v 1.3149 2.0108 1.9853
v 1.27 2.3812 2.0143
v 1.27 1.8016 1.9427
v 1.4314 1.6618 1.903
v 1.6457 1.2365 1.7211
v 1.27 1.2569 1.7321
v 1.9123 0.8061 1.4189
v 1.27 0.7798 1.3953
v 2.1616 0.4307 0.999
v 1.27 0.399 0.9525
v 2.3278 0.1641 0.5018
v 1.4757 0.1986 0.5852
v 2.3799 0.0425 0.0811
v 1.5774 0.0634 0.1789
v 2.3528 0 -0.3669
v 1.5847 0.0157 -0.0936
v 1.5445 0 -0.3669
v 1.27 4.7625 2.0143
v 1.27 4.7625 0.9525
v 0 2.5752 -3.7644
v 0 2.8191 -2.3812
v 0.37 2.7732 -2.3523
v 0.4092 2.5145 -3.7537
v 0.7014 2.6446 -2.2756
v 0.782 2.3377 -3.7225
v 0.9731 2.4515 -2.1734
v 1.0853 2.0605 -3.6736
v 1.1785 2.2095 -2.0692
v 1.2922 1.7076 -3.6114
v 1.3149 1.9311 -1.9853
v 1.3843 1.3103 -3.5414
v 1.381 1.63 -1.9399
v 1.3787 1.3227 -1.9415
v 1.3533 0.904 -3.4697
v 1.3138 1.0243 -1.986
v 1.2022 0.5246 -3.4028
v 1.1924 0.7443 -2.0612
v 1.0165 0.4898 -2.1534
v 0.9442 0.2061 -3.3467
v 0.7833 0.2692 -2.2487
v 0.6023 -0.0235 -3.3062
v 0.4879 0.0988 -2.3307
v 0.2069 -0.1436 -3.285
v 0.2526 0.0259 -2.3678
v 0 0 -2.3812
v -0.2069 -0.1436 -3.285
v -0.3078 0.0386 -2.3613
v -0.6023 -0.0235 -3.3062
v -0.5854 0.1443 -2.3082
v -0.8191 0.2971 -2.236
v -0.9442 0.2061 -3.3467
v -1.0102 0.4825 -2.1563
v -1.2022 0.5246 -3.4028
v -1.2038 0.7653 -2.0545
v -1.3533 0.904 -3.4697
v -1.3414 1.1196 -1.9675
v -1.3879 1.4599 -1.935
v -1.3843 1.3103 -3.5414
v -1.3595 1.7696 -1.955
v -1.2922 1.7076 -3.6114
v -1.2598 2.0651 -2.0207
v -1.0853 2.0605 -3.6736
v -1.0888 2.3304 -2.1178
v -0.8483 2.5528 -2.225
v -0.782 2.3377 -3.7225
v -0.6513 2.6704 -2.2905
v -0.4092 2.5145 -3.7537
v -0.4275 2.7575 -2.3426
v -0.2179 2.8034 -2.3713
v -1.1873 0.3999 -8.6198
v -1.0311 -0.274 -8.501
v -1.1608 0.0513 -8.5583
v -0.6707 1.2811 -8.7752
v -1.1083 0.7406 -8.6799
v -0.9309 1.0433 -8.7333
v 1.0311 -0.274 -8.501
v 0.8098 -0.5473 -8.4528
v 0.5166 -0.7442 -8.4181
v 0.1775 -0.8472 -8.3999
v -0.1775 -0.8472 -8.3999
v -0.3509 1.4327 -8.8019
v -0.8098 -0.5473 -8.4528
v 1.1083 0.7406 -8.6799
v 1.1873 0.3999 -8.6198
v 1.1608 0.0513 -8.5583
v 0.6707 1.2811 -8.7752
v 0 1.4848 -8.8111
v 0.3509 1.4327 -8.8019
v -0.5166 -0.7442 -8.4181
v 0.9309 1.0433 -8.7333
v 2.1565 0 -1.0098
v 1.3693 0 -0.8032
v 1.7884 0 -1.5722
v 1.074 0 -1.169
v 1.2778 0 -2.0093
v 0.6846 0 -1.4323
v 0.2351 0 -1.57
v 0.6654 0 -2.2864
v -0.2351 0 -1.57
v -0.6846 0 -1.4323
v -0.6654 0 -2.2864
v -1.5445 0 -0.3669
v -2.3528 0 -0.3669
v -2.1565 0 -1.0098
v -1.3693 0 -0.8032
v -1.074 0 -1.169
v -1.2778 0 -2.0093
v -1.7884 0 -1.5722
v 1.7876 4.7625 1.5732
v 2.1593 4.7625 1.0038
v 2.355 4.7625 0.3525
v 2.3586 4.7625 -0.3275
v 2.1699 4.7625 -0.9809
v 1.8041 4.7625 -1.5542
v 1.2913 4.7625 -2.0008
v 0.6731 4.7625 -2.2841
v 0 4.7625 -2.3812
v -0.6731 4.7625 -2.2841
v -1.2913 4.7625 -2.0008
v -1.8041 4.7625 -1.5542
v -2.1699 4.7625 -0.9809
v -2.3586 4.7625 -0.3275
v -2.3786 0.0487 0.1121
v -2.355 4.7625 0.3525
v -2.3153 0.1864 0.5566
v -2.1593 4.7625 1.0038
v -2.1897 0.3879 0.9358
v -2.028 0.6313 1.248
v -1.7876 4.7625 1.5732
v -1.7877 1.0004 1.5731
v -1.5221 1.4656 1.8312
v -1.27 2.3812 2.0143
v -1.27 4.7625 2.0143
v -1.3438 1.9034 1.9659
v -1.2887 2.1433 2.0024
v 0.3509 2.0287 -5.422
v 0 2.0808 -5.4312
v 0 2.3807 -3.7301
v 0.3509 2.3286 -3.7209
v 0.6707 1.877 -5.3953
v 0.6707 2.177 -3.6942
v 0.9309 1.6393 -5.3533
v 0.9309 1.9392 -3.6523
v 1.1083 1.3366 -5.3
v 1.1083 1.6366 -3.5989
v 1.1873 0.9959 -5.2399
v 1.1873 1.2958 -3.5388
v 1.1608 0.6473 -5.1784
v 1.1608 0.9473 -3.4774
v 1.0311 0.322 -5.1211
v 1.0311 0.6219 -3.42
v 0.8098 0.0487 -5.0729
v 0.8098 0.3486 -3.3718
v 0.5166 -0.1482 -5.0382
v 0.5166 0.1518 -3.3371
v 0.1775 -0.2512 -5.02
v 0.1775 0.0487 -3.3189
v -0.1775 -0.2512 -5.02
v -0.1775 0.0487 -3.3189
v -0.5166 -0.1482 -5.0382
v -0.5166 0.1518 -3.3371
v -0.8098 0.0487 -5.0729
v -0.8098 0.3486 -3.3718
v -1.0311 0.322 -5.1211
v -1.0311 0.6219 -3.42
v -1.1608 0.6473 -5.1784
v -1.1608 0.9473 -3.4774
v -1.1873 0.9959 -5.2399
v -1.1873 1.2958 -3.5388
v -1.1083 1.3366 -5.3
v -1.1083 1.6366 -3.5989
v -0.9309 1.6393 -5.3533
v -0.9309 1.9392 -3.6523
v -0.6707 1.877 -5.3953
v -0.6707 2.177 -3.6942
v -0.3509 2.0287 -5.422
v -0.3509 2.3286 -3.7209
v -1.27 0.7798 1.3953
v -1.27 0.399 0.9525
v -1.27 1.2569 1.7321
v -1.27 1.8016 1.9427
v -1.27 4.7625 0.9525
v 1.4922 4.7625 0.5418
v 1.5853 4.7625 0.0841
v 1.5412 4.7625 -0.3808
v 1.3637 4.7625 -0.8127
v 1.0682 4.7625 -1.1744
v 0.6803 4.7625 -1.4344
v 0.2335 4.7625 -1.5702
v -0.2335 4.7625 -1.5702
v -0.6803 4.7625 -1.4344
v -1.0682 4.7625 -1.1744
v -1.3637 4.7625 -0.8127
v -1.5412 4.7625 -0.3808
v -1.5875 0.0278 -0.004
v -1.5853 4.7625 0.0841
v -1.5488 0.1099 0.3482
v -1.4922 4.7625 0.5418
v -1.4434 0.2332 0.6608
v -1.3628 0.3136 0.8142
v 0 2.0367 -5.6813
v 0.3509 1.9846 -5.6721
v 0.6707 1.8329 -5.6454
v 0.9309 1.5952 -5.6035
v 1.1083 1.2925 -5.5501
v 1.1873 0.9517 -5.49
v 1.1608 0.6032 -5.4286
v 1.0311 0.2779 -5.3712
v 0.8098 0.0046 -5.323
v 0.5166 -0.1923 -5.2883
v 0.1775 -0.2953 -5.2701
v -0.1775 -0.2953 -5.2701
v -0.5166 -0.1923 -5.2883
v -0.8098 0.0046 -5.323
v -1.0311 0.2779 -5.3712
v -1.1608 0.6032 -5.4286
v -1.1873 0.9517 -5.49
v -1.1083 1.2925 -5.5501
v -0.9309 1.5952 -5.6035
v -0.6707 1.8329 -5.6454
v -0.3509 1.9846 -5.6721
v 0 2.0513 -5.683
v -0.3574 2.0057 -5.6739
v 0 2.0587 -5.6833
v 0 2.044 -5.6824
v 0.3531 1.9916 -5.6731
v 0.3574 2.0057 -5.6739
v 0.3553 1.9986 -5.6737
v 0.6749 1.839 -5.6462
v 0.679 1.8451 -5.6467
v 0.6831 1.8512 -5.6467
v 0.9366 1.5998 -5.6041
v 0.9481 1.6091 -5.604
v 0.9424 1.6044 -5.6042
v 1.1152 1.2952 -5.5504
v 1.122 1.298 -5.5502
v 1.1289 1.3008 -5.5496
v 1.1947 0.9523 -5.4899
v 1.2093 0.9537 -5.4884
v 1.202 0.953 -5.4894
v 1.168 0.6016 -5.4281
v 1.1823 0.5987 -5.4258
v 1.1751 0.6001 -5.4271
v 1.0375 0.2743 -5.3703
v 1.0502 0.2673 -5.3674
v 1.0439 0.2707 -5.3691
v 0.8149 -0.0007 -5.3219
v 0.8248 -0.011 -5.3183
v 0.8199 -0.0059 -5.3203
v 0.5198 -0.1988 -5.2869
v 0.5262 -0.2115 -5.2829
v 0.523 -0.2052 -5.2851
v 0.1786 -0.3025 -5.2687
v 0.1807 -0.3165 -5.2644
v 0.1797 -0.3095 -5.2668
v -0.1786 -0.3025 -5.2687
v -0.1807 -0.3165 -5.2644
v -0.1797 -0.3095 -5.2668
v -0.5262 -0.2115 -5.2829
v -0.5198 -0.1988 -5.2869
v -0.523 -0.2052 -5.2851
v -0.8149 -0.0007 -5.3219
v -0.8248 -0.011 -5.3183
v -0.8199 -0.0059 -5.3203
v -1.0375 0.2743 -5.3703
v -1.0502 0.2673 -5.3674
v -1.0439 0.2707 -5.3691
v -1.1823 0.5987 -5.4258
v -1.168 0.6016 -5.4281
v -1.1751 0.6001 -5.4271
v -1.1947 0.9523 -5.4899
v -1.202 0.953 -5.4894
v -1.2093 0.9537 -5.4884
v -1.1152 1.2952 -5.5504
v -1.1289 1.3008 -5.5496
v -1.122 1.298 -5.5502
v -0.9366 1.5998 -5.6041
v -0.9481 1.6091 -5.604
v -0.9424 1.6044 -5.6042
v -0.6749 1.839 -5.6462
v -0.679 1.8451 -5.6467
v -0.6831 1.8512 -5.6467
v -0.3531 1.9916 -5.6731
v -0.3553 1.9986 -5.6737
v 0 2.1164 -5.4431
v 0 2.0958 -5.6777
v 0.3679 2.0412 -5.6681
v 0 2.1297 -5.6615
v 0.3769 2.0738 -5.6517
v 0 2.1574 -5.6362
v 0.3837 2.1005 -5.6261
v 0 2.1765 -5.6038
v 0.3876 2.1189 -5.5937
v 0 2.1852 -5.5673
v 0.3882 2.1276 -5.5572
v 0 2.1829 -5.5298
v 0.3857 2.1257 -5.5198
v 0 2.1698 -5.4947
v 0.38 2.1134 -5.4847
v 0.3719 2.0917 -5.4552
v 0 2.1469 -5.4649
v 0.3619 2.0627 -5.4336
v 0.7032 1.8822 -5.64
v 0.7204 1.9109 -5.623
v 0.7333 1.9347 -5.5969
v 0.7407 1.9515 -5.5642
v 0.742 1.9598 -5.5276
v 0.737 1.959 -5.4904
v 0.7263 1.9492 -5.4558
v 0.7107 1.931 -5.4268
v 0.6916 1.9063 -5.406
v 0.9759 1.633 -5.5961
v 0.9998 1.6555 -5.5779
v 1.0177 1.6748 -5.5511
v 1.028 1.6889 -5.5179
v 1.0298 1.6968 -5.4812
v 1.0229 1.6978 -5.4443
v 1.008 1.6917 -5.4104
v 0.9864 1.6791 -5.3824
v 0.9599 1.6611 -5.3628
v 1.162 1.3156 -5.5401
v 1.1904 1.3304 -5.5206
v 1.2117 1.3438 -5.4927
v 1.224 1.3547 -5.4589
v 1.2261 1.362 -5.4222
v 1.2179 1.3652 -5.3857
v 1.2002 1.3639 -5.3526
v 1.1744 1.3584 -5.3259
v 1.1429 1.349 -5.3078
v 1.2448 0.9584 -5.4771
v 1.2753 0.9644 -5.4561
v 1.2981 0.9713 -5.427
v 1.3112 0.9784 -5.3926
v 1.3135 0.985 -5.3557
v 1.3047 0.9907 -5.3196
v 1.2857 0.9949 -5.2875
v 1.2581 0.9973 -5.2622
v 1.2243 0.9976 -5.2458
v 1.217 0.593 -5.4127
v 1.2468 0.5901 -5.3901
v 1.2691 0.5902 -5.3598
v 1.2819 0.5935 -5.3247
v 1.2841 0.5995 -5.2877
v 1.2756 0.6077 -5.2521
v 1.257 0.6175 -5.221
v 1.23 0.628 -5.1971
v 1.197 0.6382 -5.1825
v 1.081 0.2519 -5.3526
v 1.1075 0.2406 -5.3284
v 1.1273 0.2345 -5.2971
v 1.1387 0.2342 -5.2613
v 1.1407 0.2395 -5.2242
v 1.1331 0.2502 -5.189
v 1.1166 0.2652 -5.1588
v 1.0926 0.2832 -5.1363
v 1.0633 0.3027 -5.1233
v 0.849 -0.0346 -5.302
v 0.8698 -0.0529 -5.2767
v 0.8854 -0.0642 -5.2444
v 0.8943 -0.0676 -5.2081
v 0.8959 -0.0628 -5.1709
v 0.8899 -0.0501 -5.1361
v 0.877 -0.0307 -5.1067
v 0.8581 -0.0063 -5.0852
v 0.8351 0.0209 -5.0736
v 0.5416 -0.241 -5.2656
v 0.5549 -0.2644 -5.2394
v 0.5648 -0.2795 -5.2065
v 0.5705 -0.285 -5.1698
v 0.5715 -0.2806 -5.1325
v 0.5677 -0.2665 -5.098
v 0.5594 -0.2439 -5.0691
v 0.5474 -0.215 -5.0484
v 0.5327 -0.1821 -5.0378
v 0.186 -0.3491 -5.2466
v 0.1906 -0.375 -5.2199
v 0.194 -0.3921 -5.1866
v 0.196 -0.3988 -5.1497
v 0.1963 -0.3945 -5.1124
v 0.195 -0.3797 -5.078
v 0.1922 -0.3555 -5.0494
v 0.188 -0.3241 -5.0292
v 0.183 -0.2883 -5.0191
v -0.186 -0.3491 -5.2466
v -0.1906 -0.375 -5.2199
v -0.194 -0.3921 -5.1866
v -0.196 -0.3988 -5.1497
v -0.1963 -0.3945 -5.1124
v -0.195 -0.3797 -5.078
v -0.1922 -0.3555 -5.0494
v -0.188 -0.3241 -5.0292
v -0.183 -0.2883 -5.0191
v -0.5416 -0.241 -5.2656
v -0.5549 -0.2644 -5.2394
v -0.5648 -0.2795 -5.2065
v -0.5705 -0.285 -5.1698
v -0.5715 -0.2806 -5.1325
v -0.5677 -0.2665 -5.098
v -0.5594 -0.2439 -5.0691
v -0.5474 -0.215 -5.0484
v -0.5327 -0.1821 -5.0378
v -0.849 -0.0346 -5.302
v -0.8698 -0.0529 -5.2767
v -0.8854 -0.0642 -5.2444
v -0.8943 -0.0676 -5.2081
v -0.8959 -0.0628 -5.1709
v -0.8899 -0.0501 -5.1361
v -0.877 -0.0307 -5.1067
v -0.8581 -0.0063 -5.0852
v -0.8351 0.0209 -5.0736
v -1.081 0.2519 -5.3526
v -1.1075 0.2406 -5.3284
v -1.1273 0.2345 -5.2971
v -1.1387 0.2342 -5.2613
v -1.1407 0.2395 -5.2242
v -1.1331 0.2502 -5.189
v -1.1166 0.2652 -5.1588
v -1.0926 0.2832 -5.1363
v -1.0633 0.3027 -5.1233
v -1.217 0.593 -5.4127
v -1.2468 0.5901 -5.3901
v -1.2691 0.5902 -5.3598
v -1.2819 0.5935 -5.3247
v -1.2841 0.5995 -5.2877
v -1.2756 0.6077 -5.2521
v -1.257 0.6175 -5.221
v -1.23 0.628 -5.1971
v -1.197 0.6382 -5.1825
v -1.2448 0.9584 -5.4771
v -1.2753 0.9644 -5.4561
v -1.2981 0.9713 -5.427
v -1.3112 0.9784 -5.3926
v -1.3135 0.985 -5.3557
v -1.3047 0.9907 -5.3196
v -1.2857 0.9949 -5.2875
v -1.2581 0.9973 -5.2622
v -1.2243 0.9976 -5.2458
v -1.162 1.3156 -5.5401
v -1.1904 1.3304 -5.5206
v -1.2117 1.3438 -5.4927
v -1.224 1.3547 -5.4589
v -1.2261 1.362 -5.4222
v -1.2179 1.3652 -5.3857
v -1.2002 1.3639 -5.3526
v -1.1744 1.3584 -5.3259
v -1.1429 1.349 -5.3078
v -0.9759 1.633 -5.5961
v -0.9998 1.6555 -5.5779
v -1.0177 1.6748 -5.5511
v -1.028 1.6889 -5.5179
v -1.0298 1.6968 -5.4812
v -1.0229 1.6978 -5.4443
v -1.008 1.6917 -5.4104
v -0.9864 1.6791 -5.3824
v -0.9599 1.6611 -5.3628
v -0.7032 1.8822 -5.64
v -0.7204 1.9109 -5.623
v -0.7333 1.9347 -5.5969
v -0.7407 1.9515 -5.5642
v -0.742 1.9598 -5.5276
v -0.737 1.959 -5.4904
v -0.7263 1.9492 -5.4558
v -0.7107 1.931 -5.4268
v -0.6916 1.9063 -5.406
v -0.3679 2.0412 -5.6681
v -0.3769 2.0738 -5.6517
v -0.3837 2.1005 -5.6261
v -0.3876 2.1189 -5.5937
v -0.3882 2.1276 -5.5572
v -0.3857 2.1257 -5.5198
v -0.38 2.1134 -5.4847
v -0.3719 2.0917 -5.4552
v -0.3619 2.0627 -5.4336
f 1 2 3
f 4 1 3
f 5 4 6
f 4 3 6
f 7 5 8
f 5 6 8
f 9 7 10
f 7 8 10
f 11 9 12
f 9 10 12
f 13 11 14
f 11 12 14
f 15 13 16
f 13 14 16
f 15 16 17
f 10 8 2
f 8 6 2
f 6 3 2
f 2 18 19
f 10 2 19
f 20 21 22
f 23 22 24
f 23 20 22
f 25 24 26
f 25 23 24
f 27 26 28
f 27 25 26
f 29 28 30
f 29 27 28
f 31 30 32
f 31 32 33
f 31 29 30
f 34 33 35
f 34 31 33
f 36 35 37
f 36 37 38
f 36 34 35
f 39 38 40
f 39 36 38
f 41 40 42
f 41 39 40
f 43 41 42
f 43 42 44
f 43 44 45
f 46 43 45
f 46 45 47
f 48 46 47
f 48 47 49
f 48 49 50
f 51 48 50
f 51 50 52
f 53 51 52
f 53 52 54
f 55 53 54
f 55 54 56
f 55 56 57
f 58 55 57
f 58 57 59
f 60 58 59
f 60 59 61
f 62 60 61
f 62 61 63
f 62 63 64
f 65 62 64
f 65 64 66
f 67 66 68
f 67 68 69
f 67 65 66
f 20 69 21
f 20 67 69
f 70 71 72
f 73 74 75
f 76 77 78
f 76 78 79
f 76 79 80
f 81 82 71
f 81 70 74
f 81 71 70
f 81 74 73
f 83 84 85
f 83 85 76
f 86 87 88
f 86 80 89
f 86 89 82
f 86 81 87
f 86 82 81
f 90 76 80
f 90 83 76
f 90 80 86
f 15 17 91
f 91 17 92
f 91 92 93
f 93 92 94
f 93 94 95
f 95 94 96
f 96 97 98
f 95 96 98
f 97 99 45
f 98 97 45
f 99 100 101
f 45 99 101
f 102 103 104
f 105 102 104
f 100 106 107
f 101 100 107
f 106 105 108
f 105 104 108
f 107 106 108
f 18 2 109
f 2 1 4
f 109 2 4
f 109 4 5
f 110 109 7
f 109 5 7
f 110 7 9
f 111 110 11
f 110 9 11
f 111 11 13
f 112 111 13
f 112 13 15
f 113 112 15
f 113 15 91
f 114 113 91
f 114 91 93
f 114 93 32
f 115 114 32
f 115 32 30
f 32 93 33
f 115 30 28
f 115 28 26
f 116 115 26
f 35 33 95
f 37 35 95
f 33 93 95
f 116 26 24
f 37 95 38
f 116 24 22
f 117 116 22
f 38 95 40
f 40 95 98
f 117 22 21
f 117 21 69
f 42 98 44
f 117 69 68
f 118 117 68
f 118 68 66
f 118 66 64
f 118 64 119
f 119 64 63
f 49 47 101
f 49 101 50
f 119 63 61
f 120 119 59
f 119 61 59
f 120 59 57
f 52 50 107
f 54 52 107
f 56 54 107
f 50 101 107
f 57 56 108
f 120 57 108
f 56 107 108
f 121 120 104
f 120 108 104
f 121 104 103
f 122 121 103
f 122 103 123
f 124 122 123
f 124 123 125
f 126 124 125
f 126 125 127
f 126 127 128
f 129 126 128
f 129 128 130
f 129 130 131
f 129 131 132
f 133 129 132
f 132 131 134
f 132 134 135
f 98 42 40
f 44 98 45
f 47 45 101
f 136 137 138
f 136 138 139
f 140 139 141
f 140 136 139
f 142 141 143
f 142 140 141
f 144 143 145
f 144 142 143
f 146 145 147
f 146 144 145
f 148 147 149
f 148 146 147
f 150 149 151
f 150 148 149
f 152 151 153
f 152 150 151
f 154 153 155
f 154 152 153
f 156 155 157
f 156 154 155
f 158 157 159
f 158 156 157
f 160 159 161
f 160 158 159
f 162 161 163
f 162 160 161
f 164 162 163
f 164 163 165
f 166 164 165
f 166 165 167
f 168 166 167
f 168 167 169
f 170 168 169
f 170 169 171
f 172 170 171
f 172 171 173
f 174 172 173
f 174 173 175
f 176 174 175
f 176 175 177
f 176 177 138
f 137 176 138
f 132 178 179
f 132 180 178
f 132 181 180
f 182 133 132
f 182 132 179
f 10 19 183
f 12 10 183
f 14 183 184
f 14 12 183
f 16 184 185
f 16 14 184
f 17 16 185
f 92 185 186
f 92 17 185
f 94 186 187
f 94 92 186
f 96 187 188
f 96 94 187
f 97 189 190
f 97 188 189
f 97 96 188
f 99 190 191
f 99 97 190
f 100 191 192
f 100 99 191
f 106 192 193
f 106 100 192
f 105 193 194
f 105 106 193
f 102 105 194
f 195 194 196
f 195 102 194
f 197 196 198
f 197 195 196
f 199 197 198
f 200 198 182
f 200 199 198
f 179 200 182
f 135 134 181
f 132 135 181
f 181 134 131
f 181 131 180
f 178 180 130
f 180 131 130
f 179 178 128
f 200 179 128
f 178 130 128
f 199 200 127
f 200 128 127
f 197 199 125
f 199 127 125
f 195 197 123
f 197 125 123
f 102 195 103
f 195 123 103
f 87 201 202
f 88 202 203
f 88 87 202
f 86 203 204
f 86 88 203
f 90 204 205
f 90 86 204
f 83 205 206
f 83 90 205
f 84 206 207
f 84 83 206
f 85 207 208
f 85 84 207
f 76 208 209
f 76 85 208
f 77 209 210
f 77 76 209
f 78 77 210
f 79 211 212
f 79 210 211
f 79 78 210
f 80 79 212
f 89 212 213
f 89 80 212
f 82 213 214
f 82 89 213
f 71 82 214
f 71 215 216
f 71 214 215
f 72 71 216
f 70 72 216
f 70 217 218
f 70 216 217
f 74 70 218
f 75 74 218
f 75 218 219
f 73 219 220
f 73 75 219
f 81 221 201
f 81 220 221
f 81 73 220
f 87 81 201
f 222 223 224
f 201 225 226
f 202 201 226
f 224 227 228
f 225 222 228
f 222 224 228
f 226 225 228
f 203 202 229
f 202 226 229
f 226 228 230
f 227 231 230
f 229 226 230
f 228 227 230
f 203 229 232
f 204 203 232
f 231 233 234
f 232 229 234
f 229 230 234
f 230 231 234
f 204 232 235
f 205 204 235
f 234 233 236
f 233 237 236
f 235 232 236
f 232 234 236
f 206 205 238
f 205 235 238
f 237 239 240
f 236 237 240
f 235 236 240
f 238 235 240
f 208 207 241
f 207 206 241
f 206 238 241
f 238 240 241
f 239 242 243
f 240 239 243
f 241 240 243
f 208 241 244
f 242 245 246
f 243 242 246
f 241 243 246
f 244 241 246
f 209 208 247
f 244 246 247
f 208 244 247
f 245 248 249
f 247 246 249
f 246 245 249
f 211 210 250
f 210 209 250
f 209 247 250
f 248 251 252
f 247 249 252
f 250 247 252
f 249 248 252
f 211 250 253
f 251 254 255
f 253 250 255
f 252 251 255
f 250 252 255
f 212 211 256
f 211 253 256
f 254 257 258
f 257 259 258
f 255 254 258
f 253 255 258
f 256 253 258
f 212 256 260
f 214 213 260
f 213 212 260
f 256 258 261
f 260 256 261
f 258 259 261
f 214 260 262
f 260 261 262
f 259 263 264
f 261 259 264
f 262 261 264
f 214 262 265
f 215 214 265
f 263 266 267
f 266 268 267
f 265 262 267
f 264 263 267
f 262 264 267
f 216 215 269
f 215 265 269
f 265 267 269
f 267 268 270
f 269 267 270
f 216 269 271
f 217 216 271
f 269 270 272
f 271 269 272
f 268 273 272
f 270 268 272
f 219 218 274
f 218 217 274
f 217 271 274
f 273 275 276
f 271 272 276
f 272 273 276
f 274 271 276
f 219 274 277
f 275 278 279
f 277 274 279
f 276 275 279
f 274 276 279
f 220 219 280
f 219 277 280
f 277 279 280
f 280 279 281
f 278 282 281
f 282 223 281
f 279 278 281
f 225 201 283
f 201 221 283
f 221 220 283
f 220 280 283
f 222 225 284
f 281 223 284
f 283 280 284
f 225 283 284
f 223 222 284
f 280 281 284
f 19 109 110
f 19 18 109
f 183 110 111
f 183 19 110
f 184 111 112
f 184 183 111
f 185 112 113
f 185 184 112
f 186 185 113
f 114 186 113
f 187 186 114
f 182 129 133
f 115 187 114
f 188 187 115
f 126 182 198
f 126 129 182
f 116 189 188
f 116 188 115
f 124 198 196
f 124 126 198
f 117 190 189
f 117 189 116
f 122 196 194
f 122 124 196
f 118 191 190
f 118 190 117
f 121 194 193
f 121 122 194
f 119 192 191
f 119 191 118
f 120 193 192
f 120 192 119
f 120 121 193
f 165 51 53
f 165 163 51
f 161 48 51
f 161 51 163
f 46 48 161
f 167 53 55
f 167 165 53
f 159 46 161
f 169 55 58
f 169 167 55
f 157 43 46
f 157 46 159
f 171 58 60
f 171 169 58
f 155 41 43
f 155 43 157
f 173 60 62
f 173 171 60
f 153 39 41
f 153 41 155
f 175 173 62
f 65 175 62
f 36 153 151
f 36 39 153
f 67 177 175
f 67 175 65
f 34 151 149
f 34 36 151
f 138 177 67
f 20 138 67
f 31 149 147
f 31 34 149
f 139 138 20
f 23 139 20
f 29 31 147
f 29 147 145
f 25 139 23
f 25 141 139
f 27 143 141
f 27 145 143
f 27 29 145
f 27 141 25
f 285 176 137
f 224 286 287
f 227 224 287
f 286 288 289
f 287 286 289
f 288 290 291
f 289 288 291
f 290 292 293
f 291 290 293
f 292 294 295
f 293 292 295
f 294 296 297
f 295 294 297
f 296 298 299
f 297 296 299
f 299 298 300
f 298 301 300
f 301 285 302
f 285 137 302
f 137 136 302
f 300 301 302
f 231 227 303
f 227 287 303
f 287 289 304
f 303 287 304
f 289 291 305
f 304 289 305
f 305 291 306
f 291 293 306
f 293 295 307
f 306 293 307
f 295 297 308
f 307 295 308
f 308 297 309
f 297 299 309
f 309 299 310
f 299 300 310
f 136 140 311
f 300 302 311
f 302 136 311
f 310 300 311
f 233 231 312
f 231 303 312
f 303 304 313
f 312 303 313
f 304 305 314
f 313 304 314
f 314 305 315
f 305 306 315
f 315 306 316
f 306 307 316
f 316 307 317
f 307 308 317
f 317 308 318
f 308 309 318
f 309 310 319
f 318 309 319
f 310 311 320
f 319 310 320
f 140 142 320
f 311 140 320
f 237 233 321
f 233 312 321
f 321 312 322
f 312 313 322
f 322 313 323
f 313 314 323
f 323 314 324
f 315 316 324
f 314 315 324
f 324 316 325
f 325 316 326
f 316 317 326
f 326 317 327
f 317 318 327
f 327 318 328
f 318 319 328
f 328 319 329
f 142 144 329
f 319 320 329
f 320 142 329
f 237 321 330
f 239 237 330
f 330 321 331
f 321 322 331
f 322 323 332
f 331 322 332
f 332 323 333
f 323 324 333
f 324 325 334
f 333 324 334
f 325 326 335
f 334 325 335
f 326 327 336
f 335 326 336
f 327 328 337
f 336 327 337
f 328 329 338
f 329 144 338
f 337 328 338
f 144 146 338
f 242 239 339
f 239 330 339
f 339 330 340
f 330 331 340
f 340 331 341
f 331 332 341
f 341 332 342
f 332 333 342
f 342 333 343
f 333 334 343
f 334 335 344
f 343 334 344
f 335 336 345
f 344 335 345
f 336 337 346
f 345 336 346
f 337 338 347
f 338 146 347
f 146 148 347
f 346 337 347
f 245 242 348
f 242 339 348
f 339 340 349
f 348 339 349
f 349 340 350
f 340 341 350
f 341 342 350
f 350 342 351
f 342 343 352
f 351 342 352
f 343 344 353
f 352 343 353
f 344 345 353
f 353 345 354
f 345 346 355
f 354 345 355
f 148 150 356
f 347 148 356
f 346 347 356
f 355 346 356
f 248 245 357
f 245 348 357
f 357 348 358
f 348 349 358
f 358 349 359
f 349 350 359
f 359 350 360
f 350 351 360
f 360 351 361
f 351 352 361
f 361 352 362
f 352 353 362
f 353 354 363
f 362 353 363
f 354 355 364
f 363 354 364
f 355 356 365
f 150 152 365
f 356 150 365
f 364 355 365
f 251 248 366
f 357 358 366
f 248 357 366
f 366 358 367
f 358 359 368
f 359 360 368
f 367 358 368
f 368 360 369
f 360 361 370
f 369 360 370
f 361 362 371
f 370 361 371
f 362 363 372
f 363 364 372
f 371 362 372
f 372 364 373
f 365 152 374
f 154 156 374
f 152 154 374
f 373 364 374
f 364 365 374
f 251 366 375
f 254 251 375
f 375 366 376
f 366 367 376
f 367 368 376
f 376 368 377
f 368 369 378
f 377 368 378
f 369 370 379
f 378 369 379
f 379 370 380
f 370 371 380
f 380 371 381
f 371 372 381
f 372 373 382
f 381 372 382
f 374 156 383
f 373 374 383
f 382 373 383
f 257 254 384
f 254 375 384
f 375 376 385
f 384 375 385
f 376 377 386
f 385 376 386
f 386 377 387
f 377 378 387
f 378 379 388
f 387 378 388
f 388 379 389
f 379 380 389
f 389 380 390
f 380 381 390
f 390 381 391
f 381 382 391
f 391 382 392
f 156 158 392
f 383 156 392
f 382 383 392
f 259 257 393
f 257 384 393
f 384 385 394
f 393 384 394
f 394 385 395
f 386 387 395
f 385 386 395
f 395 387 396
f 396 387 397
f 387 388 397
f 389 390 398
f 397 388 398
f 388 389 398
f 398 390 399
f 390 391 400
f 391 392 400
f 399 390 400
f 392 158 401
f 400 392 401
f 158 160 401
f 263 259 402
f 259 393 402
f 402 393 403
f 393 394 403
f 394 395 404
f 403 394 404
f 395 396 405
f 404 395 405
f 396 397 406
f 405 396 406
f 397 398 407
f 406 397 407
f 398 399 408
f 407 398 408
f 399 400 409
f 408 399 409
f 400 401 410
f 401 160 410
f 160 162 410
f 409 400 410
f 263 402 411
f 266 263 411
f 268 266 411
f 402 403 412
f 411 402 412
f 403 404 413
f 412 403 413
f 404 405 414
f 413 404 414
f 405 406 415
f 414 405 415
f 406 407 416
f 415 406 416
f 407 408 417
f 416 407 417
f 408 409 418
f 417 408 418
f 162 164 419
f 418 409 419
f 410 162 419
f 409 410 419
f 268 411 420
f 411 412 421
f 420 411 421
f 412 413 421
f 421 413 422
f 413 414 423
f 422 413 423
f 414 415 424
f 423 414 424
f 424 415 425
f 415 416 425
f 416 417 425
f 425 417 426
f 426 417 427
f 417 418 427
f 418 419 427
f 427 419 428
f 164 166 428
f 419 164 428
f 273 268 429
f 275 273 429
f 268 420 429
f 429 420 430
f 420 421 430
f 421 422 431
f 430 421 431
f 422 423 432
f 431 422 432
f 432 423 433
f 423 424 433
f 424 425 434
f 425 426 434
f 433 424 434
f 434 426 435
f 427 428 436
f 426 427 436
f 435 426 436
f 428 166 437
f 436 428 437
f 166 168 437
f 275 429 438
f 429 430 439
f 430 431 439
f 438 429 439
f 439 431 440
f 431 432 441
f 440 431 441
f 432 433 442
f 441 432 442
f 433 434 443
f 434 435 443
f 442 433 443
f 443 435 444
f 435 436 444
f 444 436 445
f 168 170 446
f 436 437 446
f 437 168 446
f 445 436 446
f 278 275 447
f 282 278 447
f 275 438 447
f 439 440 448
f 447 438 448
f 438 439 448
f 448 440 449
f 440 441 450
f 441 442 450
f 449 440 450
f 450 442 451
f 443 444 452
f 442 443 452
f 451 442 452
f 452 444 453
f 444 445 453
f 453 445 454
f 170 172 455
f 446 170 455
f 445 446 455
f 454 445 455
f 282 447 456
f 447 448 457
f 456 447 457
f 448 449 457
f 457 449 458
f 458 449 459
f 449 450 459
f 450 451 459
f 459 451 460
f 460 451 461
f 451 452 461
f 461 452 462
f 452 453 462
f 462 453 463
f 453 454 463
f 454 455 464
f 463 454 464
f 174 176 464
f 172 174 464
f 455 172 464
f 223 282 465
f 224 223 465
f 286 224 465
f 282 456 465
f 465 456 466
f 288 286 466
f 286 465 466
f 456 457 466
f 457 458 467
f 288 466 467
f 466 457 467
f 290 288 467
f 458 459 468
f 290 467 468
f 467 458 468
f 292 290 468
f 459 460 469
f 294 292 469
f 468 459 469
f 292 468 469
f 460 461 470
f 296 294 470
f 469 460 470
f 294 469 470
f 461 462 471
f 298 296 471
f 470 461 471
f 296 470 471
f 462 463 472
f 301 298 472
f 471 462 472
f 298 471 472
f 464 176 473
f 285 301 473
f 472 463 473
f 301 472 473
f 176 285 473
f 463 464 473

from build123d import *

# Parameters (mm, degrees)
SKETCH2_R                = 2.38125
SKETCH2_R_2              = 1.5875000000000001
BOSS_EXTRUDE1_DEPTH      = 4.7625
SKETCH3_W                = 2.54
SKETCH3_H                = 2.54
CUT_EXTRUDE1_DEPTH       = 6.832847450002443
CUT_EXTRUDE2_DEPTH       = 7.456267061932925
CUT_EXTRUDE2_DEPTH_BACK  = 7.456267061932925
BOSS_EXTRUDE2_REACH      = 13.721
BOSS_EXTRUDE2_END_RADIUS = 2.38125
SKETCH6_R                = 1.1906250000000003
BOSS_EXTRUDE3_REACH      = 19.432
BOSS_EXTRUDE3_END_RADIUS = 2.38125
BOSS_EXTRUDE3_START      = -5.159375
SKETCH7_R                = 1.3881469237206399
SKETCH8_R                = 0.1270000000001564


with BuildPart() as part:
    # Sketch2 → Boss-Extrude1 (new body)
    with BuildSketch(Plane(origin=(0, 0, 0), x_dir=(1, 0, 0), z_dir=(0, 1, 0))):
        with Locations(Location((0, 0, 0), (0, 0, 90))):
            Circle(SKETCH2_R)
        with Locations(Location((0, 0, 0), (0, 0, 90))):
            Circle(SKETCH2_R_2, mode=Mode.SUBTRACT)
    extrude(amount=BOSS_EXTRUDE1_DEPTH)

    # Sketch3 → Cut-Extrude1 (cut, through all)
    with BuildSketch(Plane(origin=(0, 4.7625, 0), x_dir=(1, 0, 0), z_dir=(0, 1, 0))):
        with Locations((0, -2.2225)):
            Rectangle(SKETCH3_W, SKETCH3_H)
    extrude(amount=-CUT_EXTRUDE1_DEPTH, mode=Mode.SUBTRACT)

    # Sketch4 → Cut-Extrude2 (cut, two sides: drawn at the far end of the back side and taken through both)
    with BuildSketch(Plane(origin=(-1.27, 0, 0), x_dir=(0, 0, -1), z_dir=(1, 0, 0)).offset(-CUT_EXTRUDE2_DEPTH_BACK)):
        with BuildLine():
            Line((0.3669383154536387, 0), (-2.014311684546361, 0))
            Line((-2.014311684546361, 0), (-2.0143116845463607, 2.38125))
            ThreePointArc((-2.0143116845463607, 2.38125), (-1.3168597072468262, 0.6974519772995338), (0.3669383154536387, 0))
        make_face()
    extrude(amount=CUT_EXTRUDE2_DEPTH + CUT_EXTRUDE2_DEPTH_BACK, mode=Mode.SUBTRACT)

    # Boss-Extrude2: up to this cylinder (the profile starts outside it)
    boss_extrude2_end = Plane(origin=(0, 0.31226100000000034, 0), z_dir=(0, -1, 0)) * Cylinder(BOSS_EXTRUDE2_END_RADIUS, 33.2045, mode=Mode.PRIVATE)
    # Sketch6 → Boss-Extrude2 (add, up to the surface)
    with BuildSketch(Plane(origin=(0, 0.48483407181496907, -8.634779231627519), x_dir=(-1, 0, 0), z_dir=(0, -0.17364817766693408, -0.9848077530122075)), mode=Mode.PRIVATE) as boss_extrude2_sk1:
        with Locations(Location((4.3e-16, -0.17523538418624157, 0), (0, 0, 90))):
            Circle(SKETCH6_R)
    boss_extrude2_tool1 = extrude(boss_extrude2_sk1.sketch, amount=-BOSS_EXTRUDE2_REACH, mode=Mode.PRIVATE) - boss_extrude2_end
    add(boss_extrude2_tool1.solids().sort_by_distance((0, 0.312261, -8.60435))[0])

    # Boss-Extrude3: up to this cylinder (the profile starts outside it)
    boss_extrude3_end = Plane(origin=(0, 1.208177, 0), z_dir=(0, -1, 0)) * Cylinder(BOSS_EXTRUDE3_END_RADIUS, 44.6265, mode=Mode.PRIVATE)
    # Sketch7 → Boss-Extrude3 (add, up to the surface)
    with BuildSketch(Plane(origin=(0, -1.4620146790809783, -8.291497269485987), x_dir=(-1, 0, 0), z_dir=(0, -0.1736481776669341, -0.9848077530122075)).offset(BOSS_EXTRUDE3_START), mode=Mode.PRIVATE) as boss_extrude3_sk1:
        with Locations(Location((4.3e-16, 1.8016466467900256, 0), (0, 0, 90))):
            Circle(SKETCH7_R)
    boss_extrude3_tool1 = extrude(boss_extrude3_sk1.sketch, amount=-BOSS_EXTRUDE3_REACH, mode=Mode.PRIVATE) - boss_extrude3_end
    add(boss_extrude3_tool1.solids().sort_by_distance((0, 1.208177, -3.523357))[0])

    # Sketch8 → Revolve1 (revolve)
    with BuildSketch(Plane(origin=(0, 0, 0), x_dir=(0, 0, -1), z_dir=(1, 0, 0))):
        with Locations((5.55625, 2.0587154735803463)):
            Circle(SKETCH8_R)
    revolve(axis=Axis((-4.3e-16, 2.2625512819876596, 2.4562964209001934), (0, -0.17364817766693408, -0.9848077530122075)))


solid = part.part
